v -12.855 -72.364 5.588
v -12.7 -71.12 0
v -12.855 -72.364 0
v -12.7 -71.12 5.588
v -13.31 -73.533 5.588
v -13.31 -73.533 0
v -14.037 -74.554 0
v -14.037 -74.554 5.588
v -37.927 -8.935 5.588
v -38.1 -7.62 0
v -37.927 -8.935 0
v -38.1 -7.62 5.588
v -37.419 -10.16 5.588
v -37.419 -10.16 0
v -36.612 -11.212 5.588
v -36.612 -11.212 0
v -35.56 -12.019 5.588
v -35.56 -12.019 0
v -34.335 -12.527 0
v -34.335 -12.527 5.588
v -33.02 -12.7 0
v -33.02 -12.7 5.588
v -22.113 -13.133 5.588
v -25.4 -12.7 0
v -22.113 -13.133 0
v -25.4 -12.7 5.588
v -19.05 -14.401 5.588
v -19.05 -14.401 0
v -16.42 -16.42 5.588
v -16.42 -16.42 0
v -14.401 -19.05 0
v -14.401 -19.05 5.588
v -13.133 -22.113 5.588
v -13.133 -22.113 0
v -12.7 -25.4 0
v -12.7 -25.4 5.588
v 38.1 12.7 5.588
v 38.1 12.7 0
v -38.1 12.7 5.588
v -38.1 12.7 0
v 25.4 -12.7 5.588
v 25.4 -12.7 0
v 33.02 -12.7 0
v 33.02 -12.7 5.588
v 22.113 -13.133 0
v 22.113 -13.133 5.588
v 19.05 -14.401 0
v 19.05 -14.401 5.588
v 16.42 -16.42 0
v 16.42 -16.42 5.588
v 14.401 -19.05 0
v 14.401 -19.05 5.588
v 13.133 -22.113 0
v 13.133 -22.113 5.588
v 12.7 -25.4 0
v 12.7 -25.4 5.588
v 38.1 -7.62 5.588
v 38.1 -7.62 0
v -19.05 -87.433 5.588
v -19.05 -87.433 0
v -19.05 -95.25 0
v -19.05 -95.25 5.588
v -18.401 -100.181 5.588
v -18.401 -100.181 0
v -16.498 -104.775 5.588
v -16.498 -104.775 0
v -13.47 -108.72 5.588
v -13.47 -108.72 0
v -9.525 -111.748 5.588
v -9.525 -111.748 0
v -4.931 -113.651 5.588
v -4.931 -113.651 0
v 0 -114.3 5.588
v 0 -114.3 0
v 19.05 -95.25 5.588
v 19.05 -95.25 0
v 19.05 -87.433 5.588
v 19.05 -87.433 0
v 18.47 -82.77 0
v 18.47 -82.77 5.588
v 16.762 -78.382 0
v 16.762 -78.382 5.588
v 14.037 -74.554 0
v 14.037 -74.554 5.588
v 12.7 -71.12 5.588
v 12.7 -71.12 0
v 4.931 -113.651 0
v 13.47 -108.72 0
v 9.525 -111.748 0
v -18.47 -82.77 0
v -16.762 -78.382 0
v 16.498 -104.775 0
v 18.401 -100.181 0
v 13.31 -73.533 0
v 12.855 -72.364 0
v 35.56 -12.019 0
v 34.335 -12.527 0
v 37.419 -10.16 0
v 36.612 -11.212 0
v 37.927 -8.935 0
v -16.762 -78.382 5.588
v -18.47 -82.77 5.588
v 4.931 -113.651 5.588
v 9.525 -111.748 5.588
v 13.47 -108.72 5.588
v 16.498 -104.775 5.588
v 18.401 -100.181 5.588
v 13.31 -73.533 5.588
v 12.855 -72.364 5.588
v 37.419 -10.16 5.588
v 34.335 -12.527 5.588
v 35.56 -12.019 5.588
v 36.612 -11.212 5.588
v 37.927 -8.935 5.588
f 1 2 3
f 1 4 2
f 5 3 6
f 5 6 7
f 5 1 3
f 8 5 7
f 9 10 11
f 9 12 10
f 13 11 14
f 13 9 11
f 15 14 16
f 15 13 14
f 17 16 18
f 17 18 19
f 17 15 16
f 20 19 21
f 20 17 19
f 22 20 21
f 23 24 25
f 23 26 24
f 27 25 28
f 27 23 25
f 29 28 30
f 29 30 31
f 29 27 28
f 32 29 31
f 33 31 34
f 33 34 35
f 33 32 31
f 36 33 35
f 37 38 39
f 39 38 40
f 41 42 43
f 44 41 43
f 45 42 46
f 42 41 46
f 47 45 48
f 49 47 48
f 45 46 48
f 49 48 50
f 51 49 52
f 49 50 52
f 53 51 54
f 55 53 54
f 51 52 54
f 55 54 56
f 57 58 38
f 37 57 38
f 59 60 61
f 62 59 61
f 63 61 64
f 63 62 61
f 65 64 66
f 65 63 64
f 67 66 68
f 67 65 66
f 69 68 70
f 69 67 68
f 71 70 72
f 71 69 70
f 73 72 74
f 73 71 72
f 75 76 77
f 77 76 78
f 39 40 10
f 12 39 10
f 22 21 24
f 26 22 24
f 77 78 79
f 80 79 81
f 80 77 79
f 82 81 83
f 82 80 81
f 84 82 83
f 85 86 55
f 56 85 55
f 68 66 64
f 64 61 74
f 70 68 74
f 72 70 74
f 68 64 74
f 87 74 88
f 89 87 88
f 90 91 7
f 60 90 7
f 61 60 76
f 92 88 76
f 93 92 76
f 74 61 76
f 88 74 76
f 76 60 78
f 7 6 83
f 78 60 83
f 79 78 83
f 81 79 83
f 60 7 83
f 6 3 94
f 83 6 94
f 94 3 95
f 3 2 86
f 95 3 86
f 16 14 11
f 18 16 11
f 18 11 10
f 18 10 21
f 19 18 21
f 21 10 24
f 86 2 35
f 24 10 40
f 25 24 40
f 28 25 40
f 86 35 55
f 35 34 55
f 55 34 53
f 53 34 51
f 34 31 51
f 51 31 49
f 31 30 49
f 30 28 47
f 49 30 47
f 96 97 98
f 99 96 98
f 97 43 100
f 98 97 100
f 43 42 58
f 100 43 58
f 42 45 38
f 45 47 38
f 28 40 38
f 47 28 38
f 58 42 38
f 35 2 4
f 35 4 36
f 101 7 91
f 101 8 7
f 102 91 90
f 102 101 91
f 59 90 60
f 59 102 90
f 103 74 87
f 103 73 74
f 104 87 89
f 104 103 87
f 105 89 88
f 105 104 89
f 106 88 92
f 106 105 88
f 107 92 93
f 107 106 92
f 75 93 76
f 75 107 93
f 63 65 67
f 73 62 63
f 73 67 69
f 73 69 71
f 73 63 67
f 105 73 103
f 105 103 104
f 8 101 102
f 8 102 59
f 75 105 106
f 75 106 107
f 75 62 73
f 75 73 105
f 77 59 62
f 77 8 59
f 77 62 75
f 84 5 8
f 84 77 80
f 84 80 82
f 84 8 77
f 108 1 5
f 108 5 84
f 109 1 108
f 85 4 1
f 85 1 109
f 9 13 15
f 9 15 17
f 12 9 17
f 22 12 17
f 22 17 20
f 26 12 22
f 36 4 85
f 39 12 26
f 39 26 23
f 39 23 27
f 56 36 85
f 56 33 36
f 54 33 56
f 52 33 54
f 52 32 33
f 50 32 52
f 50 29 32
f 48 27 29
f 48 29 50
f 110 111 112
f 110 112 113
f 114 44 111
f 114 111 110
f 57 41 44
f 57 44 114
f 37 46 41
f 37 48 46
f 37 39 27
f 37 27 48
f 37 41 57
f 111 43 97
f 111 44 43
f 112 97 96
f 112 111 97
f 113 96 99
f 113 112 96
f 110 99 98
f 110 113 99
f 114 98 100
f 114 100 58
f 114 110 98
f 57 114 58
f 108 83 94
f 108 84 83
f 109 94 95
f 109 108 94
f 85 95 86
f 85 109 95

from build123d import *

# Parameters (mm, degrees)
F0_W     = 25.4
F0_H     = 63.5
F1_DEPTH = 5.588
F2_R     = 5.08
F3_R     = 12.7
F4_R     = 5.08
F5_R     = 19.04999


# Not quite as in the source:
# - a fillet or chamfer is up to 0.001 mm smaller than in the source, because OpenCascade refuses the exact size


with BuildPart() as f1:
    # F0 (on Top) → F1 (new body)
    with BuildSketch(Plane.XY):
        Polygon((38.1, 12.7), (-38.1, 12.7), (-38.1, -12.7), (-12.7, -12.7), (12.7, -12.7), (38.1, -12.7), align=None)
        with Locations((0, -44.45)):
            Rectangle(F0_W, F0_H)
        Polygon((12.7, -76.2), (-12.7, -76.2), (-19.05, -76.2), (-19.05, -114.3), (19.05, -114.3), (19.05, -76.2), align=None)
    extrude(amount=F1_DEPTH)

    # F2
    f2_edges = [f1.edges().sort_by_distance(p)[0] for p in [
        (-38.1, -12.7, 2.794),
        (38.1, -12.7, 2.794),
    ]]
    fillet(f2_edges, radius=F2_R)

    # F3
    f3_edges = [f1.edges().sort_by_distance(p)[0] for p in [
        (-12.7, -12.7, 2.794),
        (12.7, -12.7, 2.794),
    ]]
    fillet(f3_edges, radius=F3_R)

    # F4
    f4_edges = [f1.edges().sort_by_distance(p)[0] for p in [
        (-12.7, -76.2, 2.794),
        (12.7, -76.2, 2.794),
    ]]
    fillet(f4_edges, radius=F4_R)

    # F5 (radius 19.05 in the source; OpenCascade refuses exactly that, so slightly less here)
    f5_edges = [f1.edges().sort_by_distance(p)[0] for p in [
        (-19.05, -114.3, 2.794),
        (-19.05, -76.2, 2.794),
        (19.05, -114.3, 2.794),
        (19.05, -76.2, 2.794),
    ]]
    fillet(f5_edges, radius=F5_R)


solid = f1.part
